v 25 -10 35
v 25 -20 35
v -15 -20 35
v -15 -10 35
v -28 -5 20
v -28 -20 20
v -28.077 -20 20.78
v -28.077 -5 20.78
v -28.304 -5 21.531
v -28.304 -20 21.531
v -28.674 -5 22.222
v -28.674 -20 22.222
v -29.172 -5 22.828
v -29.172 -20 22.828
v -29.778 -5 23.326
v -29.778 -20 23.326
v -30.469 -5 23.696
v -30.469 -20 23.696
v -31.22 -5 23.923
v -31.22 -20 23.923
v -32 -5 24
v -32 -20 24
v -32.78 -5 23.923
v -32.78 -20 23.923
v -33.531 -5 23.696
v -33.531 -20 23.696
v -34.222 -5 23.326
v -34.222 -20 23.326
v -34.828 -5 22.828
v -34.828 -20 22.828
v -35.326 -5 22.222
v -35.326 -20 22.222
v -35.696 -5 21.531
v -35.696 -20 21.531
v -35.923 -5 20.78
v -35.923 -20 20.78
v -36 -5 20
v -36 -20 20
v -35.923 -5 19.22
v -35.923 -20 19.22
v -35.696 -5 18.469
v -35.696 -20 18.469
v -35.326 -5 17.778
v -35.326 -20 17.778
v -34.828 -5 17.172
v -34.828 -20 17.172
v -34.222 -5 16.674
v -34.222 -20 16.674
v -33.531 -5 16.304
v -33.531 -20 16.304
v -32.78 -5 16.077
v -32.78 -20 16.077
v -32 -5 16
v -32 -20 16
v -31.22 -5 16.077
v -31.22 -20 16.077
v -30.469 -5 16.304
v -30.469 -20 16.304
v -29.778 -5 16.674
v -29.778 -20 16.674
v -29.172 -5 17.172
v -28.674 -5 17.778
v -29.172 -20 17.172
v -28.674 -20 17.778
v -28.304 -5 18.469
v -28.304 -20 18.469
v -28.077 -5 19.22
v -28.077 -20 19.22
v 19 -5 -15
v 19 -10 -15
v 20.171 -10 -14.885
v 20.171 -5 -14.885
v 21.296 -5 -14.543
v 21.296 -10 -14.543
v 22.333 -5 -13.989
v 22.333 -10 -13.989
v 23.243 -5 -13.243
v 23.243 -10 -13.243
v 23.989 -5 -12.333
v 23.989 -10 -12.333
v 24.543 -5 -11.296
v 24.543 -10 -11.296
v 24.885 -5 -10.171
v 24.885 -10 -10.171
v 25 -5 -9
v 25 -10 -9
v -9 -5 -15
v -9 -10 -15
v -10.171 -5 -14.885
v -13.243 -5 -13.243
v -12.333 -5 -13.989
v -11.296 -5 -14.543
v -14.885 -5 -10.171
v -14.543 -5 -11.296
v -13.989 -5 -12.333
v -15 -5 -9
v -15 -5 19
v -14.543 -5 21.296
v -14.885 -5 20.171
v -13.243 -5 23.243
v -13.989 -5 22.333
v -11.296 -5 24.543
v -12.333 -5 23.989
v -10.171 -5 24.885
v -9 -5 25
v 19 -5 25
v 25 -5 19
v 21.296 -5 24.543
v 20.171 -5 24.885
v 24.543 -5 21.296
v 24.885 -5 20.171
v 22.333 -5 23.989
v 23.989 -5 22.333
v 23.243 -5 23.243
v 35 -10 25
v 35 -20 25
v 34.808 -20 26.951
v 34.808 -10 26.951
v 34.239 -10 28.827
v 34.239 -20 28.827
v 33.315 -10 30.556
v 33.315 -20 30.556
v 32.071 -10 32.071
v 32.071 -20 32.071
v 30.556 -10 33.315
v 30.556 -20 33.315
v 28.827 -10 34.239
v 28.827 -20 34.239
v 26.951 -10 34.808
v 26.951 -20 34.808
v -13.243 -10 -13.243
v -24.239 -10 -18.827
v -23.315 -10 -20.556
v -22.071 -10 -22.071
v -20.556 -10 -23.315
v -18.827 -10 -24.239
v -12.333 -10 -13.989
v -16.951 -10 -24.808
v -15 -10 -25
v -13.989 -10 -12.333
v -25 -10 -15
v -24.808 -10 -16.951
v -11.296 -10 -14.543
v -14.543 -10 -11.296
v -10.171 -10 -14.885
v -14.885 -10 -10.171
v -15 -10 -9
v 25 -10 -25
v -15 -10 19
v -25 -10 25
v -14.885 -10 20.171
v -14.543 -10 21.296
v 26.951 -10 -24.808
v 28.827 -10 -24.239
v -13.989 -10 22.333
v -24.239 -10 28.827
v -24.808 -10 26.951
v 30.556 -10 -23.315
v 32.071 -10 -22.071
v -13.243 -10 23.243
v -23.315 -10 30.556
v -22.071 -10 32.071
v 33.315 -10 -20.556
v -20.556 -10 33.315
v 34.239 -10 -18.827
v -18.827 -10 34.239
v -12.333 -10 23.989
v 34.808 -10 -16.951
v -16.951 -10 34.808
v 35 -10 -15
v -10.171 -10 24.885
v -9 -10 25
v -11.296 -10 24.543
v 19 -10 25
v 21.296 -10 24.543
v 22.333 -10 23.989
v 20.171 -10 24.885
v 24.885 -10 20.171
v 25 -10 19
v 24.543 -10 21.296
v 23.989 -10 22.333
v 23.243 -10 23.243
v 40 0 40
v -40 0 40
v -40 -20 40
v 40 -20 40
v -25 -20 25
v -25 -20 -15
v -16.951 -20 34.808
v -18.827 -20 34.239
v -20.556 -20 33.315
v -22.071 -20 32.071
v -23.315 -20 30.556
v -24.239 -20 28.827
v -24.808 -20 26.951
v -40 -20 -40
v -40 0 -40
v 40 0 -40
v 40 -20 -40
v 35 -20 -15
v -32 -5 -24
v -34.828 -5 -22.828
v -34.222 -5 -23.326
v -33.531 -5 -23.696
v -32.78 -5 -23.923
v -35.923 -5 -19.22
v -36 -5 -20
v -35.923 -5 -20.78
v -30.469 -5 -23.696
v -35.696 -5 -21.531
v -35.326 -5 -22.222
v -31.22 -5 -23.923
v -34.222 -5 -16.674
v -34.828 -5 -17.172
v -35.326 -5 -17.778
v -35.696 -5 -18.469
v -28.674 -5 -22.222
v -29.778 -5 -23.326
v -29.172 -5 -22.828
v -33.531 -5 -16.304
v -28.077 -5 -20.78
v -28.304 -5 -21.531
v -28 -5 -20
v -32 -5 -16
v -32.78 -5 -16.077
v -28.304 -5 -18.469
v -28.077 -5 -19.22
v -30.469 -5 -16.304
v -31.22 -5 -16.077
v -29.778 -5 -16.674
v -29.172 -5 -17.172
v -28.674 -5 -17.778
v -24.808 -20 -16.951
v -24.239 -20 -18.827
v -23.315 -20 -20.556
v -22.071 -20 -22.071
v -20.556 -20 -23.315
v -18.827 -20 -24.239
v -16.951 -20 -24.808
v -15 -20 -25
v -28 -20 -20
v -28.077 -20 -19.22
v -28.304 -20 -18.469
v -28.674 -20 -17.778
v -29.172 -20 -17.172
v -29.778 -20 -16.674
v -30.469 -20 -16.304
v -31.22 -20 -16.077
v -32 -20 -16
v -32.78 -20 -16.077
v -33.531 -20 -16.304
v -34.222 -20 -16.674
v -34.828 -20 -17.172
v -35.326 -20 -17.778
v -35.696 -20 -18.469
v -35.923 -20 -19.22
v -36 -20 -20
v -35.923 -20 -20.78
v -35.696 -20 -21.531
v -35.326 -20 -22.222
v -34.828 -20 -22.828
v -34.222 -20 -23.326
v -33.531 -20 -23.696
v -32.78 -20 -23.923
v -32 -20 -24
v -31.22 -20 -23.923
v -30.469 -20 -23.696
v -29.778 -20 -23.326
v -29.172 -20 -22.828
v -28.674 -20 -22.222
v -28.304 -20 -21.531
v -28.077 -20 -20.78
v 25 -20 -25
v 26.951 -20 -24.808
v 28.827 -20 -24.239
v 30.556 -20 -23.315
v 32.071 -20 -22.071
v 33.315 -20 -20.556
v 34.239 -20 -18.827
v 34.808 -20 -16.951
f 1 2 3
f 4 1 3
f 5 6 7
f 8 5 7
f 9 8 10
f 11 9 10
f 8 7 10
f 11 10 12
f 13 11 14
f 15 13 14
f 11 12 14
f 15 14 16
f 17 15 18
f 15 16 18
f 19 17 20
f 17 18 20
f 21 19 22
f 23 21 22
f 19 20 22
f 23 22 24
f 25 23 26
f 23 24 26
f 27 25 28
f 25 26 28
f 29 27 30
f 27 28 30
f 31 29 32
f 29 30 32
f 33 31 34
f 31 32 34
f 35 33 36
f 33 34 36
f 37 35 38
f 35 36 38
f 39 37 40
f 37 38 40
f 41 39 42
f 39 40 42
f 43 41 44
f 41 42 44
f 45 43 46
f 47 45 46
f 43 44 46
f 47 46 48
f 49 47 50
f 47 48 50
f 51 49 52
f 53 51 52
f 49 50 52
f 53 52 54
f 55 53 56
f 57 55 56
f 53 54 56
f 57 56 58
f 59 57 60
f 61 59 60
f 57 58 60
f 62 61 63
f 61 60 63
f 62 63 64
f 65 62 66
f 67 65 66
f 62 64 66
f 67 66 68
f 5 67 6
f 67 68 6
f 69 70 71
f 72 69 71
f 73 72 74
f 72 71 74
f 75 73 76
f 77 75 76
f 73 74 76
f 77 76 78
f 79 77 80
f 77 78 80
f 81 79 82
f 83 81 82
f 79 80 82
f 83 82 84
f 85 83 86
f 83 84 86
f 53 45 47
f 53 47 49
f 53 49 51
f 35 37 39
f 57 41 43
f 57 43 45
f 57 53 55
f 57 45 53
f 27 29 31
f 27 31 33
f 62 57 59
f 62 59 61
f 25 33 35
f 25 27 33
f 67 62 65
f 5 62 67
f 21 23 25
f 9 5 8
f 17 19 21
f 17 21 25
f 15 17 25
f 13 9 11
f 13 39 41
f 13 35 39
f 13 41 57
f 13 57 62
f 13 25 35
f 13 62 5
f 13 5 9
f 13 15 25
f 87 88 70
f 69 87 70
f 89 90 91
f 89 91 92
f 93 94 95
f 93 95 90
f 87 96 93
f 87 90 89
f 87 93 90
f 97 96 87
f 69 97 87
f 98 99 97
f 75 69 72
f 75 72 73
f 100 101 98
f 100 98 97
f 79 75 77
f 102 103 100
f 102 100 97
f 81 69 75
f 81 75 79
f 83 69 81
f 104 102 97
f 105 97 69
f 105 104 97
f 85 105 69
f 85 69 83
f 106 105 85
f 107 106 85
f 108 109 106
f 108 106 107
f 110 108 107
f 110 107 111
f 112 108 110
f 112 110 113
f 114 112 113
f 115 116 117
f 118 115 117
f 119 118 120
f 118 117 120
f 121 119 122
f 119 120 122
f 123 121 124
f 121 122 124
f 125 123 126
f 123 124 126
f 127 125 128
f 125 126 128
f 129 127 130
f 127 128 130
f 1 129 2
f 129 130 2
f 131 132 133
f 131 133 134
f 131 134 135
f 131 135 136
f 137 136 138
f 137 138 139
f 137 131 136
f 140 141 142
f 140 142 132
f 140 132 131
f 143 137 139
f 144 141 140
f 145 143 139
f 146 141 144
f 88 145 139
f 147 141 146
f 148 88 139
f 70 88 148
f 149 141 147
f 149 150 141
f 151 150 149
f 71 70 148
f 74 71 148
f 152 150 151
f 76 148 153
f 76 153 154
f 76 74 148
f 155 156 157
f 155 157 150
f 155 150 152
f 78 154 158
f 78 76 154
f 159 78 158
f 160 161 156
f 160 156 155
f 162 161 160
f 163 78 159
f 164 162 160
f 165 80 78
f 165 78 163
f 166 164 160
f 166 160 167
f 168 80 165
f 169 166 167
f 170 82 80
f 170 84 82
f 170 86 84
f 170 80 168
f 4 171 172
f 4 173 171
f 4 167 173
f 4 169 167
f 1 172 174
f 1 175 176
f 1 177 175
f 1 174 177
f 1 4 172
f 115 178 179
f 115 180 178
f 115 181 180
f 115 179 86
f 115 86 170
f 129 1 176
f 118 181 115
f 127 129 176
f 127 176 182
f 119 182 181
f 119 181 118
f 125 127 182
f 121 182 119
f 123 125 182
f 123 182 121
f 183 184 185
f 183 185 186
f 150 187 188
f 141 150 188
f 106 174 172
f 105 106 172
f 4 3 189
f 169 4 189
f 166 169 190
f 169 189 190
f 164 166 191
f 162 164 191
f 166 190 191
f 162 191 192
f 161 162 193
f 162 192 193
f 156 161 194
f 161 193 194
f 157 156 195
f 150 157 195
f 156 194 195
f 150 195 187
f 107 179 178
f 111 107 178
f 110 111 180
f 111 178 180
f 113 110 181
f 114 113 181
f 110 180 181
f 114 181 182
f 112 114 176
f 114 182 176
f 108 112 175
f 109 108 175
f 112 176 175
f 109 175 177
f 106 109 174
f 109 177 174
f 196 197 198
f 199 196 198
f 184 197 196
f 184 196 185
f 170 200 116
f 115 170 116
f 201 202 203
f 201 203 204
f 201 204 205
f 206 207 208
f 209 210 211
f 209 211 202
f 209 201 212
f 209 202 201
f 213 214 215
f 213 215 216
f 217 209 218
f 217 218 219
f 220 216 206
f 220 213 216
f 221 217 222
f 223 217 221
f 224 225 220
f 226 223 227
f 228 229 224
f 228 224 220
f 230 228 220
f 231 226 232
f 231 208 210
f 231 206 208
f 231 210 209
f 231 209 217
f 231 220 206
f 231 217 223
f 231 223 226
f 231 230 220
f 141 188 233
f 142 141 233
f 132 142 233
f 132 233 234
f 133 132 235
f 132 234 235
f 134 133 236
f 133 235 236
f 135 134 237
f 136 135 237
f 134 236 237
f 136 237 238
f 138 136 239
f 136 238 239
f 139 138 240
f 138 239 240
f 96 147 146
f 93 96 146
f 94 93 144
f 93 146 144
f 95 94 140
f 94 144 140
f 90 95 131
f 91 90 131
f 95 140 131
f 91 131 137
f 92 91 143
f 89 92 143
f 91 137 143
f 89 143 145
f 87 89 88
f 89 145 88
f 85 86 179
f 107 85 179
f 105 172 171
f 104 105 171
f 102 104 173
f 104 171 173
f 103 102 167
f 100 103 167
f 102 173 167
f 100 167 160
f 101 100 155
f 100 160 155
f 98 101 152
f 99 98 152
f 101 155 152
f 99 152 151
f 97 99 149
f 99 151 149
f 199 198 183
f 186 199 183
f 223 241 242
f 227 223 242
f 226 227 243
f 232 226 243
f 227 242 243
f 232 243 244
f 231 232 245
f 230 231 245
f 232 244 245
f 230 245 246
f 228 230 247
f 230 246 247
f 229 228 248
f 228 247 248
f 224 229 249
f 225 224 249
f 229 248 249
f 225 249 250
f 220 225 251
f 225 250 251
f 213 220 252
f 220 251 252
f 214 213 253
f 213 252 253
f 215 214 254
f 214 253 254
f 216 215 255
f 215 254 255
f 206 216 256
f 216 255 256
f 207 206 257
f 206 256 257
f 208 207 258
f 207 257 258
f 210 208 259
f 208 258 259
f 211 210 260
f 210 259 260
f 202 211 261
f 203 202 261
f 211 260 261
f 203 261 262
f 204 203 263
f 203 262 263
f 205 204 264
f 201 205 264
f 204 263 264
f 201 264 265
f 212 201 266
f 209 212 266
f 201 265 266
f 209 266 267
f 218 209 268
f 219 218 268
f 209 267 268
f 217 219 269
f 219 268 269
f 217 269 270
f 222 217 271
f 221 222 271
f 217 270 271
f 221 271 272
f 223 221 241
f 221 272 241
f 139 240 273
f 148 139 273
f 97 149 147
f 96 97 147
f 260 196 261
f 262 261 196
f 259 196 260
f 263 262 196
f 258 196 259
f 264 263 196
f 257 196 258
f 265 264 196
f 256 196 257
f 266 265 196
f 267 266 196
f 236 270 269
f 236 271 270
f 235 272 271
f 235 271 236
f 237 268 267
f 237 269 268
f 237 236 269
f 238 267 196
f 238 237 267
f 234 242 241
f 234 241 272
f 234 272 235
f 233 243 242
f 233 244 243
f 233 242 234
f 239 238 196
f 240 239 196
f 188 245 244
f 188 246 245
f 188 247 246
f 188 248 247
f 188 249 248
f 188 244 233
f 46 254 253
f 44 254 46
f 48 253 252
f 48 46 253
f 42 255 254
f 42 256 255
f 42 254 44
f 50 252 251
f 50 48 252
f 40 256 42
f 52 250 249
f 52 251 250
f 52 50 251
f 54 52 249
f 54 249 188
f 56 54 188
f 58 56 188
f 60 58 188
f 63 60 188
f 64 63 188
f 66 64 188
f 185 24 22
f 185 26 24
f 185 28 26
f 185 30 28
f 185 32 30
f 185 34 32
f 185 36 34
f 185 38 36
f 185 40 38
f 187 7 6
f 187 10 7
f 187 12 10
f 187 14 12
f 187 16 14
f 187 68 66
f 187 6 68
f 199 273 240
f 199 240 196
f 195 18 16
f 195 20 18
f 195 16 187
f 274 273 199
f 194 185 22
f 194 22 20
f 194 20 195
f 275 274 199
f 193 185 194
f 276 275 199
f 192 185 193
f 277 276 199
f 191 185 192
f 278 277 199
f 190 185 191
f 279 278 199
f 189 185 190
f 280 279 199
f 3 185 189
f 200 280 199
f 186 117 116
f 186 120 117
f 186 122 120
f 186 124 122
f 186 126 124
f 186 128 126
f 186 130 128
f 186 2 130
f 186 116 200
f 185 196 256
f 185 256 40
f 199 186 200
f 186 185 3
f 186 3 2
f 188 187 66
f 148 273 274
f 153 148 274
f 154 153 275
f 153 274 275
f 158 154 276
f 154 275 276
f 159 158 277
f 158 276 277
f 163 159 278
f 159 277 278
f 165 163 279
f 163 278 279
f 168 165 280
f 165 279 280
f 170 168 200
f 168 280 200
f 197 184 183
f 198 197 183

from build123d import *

# Parameters (mm, degrees)
F0_W     = 80
F0_H     = 80
F1_DEPTH = 20
F2_R     = 4
F3_DEPTH = 15
F5_DEPTH = 10
F7_DEPTH = 5


with BuildPart() as f1:
    # F0 (on Front) → F1 (new body)
    with BuildSketch(Plane.XZ):
        Rectangle(F0_W, F0_H)
    extrude(amount=F1_DEPTH)

    # F2 (on face) → F3 (cut)
    with BuildSketch(Plane.XZ.offset(20)):
        with Locations((-32, 20)):
            Circle(F2_R)
        with Locations((-32, -20)):
            Circle(F2_R)
    extrude(amount=-F3_DEPTH, mode=Mode.SUBTRACT)

    # F4 (on face) → F5 (cut)
    with BuildSketch(Plane.XZ.offset(20)):
        with BuildLine():
            Line((-15, -25), (25, -25))
            ThreePointArc((25, -25), (32.071068, -22.071068), (35, -15))
            Line((35, -15), (35, 25))
            ThreePointArc((35, 25), (32.071068, 32.071068), (25, 35))
            Line((25, 35), (-15, 35))
            ThreePointArc((-15, 35), (-22.071068, 32.071068), (-25, 25))
            Line((-25, 25), (-25, -15))
            ThreePointArc((-25, -15), (-22.071068, -22.071068), (-15, -25))
        make_face()
    extrude(amount=-F5_DEPTH, mode=Mode.SUBTRACT)

    # F6 (on face) → F7 (cut)
    with BuildSketch(Plane.XZ.offset(10)):
        with BuildLine():
            Line((19, 25), (-9, 25))
            ThreePointArc((-9, 25), (-13.242641, 23.242641), (-15, 19))
            Line((-15, 19), (-15, -9))
            ThreePointArc((-15, -9), (-13.242641, -13.242641), (-9, -15))
            Line((-9, -15), (19, -15))
            ThreePointArc((19, -15), (23.242641, -13.242641), (25, -9))
            Line((25, -9), (25, 19))
            ThreePointArc((25, 19), (23.242641, 23.242641), (19, 25))
        make_face()
    extrude(amount=-F7_DEPTH, mode=Mode.SUBTRACT)


solid = f1.part
